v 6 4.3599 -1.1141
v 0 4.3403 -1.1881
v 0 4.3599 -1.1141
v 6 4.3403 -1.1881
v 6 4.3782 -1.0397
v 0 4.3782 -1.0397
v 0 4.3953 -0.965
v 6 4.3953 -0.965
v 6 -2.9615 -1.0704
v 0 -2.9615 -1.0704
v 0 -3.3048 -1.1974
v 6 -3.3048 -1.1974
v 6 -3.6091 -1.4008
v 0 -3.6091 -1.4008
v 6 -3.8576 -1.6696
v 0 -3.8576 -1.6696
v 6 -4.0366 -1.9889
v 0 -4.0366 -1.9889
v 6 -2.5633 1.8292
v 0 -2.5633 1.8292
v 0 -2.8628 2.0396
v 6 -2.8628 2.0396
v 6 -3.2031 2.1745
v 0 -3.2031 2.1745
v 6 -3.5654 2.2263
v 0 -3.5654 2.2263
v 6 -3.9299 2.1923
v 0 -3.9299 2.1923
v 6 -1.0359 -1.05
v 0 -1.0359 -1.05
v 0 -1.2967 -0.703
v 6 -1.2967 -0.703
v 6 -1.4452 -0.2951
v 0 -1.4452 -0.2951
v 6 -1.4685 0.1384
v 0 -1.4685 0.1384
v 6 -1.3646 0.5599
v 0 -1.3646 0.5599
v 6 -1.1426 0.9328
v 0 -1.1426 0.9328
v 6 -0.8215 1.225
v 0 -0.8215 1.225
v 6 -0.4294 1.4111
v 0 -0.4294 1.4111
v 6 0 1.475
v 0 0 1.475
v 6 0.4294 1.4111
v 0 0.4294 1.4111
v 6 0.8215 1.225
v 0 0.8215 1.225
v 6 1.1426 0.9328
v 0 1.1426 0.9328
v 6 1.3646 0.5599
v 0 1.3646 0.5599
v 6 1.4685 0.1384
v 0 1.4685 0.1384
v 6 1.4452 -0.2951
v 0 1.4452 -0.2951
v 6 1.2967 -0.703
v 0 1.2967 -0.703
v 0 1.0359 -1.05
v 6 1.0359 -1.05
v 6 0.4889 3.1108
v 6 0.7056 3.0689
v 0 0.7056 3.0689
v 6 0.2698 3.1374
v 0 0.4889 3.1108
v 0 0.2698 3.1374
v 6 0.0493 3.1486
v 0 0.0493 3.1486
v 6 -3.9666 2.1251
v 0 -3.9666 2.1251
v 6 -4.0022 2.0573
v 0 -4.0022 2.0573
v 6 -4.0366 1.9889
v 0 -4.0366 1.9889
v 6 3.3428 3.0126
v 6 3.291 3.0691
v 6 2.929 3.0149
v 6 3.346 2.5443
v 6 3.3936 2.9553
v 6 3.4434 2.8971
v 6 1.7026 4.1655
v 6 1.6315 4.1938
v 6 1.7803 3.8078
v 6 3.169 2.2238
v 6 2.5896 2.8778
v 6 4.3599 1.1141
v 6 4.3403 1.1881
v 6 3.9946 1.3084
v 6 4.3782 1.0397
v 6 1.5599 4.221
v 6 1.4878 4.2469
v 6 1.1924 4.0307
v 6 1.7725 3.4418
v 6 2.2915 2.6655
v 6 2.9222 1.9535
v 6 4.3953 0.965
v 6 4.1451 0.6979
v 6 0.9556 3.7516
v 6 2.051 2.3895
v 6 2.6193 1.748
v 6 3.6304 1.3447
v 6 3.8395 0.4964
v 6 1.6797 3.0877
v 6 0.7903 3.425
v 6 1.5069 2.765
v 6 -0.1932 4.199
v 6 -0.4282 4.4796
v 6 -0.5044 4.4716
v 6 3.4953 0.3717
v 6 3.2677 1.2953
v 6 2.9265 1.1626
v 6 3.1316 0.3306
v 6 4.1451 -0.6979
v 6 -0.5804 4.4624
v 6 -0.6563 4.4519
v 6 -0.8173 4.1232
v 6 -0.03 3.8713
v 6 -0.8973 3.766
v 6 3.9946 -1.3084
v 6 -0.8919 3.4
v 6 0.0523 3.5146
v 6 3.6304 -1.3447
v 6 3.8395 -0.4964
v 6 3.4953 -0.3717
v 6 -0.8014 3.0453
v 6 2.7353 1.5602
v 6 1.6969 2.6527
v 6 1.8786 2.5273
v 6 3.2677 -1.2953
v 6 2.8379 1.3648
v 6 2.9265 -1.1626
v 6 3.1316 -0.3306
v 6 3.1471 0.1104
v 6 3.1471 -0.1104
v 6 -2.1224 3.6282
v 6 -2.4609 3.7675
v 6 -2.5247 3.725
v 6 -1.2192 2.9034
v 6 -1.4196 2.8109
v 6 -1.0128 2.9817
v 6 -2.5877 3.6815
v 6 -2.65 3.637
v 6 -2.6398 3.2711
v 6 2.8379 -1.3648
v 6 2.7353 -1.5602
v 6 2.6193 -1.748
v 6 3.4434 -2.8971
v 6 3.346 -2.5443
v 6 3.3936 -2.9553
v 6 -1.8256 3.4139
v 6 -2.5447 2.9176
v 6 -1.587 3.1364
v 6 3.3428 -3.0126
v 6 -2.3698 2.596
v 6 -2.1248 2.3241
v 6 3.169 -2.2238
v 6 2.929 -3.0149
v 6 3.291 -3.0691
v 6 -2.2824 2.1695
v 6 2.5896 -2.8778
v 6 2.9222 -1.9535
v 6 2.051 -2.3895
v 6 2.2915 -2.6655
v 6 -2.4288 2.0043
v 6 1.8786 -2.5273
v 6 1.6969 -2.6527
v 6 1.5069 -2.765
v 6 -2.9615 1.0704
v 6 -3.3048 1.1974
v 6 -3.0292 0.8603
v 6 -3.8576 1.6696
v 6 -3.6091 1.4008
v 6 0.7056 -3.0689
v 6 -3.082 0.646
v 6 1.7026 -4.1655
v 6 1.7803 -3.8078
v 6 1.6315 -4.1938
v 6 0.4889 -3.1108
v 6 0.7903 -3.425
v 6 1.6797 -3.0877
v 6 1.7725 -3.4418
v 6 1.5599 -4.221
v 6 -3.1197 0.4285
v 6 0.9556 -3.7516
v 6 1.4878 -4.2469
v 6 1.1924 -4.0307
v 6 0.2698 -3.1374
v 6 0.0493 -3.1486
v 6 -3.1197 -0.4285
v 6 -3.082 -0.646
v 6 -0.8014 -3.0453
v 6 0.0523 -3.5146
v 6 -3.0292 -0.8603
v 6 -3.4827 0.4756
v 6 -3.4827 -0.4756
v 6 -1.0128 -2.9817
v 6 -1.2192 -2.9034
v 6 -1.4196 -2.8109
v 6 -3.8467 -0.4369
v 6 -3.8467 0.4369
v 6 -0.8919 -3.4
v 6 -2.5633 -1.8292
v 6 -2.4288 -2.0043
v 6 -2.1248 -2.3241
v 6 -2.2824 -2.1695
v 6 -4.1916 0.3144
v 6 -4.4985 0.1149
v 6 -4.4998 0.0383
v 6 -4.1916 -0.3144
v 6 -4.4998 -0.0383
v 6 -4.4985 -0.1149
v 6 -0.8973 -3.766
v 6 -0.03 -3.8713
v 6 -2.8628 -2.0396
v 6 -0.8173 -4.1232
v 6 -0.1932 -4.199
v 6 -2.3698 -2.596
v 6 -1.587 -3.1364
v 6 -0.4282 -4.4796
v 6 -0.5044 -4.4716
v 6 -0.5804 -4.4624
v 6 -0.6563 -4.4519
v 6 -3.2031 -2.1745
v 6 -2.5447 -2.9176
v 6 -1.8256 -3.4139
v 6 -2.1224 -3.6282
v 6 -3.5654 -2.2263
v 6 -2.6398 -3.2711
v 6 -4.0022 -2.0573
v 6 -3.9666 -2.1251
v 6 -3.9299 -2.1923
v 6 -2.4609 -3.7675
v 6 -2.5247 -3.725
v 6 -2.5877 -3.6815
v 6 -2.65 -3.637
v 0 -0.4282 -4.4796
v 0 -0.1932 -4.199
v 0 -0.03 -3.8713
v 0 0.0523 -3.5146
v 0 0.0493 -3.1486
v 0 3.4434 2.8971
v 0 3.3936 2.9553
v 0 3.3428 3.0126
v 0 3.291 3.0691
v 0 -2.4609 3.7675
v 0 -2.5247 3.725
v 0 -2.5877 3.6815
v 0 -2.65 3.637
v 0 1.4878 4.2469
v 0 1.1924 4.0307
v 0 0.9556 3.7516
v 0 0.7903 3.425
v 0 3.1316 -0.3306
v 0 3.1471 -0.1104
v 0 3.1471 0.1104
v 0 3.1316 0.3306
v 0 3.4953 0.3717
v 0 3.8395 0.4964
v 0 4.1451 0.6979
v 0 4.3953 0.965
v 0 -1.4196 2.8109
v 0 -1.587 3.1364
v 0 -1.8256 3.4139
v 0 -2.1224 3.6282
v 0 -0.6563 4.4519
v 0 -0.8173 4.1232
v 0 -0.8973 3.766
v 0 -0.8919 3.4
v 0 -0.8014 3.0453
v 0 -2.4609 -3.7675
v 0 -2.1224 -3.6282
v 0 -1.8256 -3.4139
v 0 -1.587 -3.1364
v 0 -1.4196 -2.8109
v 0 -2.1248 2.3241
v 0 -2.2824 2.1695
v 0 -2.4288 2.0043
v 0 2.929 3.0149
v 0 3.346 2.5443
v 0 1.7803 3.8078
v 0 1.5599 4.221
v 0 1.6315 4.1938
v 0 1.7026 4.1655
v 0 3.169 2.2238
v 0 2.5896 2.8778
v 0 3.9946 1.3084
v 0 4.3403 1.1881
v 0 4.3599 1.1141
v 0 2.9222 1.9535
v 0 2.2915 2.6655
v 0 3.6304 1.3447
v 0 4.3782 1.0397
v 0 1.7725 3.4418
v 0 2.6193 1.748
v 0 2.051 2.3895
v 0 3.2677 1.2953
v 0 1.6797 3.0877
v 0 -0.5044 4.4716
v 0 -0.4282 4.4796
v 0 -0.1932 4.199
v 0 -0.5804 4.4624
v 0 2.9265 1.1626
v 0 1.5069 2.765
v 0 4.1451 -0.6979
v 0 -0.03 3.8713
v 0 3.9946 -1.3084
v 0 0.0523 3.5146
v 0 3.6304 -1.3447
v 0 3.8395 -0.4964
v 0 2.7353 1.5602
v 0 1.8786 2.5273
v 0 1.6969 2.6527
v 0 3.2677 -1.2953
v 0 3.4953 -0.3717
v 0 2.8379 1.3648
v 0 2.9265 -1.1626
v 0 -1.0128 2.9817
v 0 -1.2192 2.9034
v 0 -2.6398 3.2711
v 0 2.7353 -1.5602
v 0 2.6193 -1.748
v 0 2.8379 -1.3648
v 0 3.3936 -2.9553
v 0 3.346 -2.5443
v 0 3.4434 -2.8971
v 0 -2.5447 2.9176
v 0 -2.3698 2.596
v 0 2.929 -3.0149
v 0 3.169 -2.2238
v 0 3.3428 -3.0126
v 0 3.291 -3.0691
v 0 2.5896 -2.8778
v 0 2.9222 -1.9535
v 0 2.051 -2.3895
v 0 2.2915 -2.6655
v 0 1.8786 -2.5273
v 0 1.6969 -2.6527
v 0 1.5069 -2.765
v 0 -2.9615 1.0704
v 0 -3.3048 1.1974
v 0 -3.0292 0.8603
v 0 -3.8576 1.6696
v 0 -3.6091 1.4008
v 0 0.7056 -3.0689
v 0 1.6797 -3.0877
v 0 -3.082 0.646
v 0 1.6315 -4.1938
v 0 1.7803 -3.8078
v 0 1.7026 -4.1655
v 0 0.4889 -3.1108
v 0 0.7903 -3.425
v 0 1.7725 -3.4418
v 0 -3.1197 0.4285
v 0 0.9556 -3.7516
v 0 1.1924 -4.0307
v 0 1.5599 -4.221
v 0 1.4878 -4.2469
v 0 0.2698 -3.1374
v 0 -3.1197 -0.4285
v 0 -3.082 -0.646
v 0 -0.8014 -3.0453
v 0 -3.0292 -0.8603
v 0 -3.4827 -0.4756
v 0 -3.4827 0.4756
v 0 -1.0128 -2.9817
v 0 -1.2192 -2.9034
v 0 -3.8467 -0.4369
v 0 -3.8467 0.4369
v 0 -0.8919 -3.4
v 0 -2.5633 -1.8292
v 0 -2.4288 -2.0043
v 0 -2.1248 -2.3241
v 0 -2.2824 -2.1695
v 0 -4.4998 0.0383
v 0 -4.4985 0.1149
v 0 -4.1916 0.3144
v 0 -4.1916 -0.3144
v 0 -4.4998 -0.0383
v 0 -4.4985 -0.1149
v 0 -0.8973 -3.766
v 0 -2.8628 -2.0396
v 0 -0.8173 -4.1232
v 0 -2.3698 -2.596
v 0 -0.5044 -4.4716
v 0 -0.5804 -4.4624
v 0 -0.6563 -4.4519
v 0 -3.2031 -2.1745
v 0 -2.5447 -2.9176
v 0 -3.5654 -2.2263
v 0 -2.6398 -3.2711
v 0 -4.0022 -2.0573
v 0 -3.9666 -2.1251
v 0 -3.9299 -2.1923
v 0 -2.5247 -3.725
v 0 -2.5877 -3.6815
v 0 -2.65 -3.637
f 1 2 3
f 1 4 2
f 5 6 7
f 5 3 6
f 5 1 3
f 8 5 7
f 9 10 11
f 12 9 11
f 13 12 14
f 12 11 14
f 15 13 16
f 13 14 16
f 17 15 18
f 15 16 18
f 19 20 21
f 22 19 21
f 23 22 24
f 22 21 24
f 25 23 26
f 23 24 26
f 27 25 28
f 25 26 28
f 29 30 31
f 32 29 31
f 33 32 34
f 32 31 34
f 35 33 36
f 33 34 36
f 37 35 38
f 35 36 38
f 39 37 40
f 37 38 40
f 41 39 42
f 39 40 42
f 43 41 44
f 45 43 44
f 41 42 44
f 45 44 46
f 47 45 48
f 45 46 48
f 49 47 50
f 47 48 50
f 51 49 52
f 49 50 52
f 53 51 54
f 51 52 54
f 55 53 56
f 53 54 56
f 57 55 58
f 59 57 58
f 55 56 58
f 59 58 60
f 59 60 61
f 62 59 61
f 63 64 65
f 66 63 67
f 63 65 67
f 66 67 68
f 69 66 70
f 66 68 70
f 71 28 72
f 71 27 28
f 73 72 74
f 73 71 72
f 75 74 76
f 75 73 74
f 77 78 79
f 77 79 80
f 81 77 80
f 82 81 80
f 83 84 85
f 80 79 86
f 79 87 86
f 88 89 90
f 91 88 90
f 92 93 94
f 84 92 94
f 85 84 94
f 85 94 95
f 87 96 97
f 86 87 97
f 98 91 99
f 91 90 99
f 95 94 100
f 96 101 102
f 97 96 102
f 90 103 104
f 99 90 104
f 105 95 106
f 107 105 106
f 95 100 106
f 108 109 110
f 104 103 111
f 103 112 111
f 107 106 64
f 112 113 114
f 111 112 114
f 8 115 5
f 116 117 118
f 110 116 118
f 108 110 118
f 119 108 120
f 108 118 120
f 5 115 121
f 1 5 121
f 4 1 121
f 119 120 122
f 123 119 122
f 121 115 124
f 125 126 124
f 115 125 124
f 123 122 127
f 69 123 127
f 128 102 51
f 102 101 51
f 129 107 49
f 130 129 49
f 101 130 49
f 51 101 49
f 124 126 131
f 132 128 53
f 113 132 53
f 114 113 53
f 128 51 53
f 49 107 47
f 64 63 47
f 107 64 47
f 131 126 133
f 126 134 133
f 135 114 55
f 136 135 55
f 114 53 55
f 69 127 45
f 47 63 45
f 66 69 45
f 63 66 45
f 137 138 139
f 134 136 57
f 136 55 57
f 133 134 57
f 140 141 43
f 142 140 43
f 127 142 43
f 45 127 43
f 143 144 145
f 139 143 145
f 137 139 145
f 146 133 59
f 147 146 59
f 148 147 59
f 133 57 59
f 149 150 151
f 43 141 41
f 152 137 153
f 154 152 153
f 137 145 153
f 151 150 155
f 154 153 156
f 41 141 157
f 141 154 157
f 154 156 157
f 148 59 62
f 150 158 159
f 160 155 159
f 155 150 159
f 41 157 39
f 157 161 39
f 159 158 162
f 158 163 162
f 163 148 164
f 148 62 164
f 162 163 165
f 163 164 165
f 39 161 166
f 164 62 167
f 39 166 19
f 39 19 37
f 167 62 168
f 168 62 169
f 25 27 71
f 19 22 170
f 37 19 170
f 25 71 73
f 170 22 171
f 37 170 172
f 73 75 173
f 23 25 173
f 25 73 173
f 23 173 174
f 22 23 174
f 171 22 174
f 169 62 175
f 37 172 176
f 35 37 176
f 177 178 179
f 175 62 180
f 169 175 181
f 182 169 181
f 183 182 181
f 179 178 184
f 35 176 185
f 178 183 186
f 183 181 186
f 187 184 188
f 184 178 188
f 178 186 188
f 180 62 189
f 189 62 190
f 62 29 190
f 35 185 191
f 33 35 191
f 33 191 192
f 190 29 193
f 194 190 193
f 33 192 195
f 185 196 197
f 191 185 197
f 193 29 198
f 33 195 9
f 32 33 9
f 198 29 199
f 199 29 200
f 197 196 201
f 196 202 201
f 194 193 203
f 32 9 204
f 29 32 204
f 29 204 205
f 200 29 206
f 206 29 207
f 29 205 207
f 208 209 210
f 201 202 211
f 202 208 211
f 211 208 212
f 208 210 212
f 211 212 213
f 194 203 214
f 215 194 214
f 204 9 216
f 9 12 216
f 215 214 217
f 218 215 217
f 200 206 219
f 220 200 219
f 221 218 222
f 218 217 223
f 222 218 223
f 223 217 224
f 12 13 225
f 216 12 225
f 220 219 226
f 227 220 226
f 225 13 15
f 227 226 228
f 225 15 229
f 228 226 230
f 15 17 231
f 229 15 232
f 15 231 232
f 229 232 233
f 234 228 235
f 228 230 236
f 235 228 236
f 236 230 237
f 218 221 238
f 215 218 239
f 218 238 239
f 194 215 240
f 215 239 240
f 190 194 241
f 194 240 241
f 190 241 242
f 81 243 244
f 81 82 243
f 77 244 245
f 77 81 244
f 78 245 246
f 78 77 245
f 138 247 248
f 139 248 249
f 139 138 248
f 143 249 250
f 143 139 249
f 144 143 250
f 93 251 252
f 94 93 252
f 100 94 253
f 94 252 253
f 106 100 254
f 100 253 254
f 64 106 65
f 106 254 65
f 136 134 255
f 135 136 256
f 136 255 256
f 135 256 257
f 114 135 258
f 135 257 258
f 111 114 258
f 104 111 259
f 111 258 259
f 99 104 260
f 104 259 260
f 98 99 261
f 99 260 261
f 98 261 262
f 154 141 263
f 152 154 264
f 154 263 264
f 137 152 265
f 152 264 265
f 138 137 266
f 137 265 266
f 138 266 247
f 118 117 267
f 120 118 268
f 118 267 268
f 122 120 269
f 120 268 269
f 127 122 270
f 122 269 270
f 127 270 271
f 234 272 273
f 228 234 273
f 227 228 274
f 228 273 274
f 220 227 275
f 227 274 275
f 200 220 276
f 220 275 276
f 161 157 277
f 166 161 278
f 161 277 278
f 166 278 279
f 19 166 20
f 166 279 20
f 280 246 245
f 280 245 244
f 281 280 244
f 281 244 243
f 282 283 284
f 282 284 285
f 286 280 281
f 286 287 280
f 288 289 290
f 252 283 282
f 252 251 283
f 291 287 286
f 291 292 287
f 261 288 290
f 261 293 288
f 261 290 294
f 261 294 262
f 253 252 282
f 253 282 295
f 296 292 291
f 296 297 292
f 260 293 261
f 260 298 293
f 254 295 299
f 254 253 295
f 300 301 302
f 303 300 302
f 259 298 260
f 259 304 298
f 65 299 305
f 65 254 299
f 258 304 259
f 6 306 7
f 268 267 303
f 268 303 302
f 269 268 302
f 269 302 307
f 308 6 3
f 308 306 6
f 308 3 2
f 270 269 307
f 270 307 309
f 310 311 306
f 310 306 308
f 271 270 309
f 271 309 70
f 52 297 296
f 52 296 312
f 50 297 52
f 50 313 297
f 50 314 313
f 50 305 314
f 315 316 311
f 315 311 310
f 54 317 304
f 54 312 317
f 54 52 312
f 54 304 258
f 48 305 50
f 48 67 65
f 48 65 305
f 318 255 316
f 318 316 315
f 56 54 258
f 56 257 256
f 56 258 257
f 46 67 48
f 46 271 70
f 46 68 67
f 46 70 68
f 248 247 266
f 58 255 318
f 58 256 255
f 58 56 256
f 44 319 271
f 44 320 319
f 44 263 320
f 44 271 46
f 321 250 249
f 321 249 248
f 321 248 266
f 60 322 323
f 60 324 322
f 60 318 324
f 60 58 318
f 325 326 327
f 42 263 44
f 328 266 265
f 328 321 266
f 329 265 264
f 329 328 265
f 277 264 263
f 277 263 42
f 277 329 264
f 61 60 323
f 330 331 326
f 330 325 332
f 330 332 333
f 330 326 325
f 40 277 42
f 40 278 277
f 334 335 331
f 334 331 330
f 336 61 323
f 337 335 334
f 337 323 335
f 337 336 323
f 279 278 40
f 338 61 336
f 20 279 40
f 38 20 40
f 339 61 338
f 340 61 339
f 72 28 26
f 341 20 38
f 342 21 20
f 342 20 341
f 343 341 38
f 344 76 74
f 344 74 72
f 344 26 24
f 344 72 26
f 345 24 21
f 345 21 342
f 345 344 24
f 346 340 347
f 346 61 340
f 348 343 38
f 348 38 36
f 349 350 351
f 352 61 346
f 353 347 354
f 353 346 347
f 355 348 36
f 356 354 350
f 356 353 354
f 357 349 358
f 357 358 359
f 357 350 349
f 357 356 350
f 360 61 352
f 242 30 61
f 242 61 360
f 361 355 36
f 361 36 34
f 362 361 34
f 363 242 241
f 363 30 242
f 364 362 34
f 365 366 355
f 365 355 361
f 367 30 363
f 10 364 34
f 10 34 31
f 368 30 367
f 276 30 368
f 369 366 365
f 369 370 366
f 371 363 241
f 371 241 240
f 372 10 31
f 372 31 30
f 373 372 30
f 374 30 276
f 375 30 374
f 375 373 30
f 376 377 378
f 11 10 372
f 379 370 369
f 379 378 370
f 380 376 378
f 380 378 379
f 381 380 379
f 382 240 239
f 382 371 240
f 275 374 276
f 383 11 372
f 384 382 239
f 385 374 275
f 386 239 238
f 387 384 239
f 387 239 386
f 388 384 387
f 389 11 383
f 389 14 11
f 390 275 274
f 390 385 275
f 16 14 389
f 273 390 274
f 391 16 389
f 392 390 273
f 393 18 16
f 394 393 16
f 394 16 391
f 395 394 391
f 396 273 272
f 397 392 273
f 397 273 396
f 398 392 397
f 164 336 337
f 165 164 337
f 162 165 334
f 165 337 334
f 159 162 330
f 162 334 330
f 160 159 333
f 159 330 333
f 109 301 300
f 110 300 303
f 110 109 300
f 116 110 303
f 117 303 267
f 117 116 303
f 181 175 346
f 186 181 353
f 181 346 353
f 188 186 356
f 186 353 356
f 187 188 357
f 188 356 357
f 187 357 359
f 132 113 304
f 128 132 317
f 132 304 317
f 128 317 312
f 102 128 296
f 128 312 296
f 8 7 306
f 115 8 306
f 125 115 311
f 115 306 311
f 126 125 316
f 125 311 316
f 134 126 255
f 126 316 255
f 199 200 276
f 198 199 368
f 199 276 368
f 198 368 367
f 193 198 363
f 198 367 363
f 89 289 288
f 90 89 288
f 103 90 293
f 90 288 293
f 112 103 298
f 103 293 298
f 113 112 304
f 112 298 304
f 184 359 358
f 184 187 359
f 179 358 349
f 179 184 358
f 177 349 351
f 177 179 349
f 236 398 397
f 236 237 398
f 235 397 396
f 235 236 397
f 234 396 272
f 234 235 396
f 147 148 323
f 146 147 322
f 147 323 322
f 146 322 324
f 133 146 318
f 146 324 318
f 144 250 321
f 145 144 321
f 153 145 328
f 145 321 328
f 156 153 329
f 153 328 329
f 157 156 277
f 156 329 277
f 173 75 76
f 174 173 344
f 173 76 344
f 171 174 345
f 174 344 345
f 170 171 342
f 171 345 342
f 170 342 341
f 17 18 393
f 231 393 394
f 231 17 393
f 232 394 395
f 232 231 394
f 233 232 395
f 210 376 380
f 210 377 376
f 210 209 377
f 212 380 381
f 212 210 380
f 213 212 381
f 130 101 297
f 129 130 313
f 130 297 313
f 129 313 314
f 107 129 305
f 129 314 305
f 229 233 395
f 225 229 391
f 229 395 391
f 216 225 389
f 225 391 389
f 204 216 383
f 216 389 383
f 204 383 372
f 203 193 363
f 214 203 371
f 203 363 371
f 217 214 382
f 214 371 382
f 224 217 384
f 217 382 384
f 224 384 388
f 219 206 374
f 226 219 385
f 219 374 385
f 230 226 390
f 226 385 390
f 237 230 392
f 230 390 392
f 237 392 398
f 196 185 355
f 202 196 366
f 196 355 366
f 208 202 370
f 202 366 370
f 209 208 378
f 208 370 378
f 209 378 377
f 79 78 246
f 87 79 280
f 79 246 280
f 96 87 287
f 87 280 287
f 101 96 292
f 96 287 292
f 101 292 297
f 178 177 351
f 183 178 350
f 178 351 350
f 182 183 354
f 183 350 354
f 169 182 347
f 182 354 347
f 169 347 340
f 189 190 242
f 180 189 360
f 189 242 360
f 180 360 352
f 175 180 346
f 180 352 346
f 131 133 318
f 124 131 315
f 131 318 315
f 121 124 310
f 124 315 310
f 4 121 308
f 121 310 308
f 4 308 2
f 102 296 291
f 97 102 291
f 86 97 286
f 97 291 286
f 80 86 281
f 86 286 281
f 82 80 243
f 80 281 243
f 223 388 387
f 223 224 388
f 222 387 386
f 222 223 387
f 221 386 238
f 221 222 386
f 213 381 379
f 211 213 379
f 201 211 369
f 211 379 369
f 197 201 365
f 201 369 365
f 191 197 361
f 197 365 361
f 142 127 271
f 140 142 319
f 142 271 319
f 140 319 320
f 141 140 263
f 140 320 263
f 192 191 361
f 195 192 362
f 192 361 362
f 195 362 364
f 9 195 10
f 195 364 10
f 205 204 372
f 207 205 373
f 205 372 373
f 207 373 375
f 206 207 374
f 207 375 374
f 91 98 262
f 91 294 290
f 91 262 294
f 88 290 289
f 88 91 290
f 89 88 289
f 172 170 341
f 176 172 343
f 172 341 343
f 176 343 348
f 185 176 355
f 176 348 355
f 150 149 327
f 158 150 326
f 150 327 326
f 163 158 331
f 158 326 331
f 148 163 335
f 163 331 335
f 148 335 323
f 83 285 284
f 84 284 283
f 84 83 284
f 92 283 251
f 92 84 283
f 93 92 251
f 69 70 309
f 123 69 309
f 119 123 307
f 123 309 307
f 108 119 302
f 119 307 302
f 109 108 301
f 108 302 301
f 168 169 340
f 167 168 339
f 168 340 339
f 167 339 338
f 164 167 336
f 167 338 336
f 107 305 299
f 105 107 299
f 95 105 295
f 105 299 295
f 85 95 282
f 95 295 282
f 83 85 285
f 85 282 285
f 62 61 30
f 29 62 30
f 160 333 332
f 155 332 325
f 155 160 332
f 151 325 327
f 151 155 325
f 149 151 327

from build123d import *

# Parameters (mm, degrees)
BASPROSKE_W        = 6
BASPROSKE_H        = 4.5
TOOTHCUT_DEPTH     = 9.746427842
TEETHCUTS_COUNT    = 13
CUT_EXTRUDE1_REACH = 10.736


with BuildPart() as part:
    # BasProSke → Base-Revolve (revolve)
    with BuildSketch(Plane(origin=(0, 0, 0), x_dir=(1, 0, 0), z_dir=(0, 1, 0)), mode=Mode.PRIVATE) as base_revolve_sk:
        with Locations((3, 2.25)):
            Rectangle(BASPROSKE_W, BASPROSKE_H)
    revolve(base_revolve_sk.sketch.rotate(Axis((-10, 0, 0), (1, 0, 0)), 180), axis=Axis((-10, 0, 0), (1, 0, 0)))

    # TooCutSke → ToothCut (cut, through all)
    with BuildSketch(Plane(origin=(0, 0, 0), x_dir=(0, 0, -1), z_dir=(1, 0, 0))):
        with BuildLine():
            ThreePointArc((0.330578579, 3.131600039), (0, 3.149), (-0.330578579, 3.131600039))
            ThreePointArc((-0.330578579, 3.131600039), (-0.504119116, 3.854627805), (-0.992642471, 4.415190379))
            ThreePointArc((-0.992642471, 4.415190379), (0, 4.5254), (0.992642471, 4.415190379))
            ThreePointArc((0.992642471, 4.415190379), (0.504119116, 3.854627805), (0.330578579, 3.131600039))
        make_face()
    toothcut = extrude(amount=TOOTHCUT_DEPTH, mode=Mode.SUBTRACT)

    # TeethCuts: ToothCut ×13 about axis
    teethcuts_axis = Axis((0, 0, 0), (1, 0, 0))
    for i in range(1, TEETHCUTS_COUNT):
        add(toothcut.rotate(teethcuts_axis, i * 360 / TEETHCUTS_COUNT), mode=Mode.SUBTRACT)

    # Sketch1 → Cut-Extrude1 (cut, up to next)
    with BuildSketch(Plane.ZY, mode=Mode.PRIVATE) as cut_extrude1_sk1:
        with BuildLine():
            Line((-1.05, 1.035917468), (-1.05, -1.035917468))
            ThreePointArc((-1.05, -1.035917468), (1.475, 0), (-1.05, 1.035917468))
        make_face()
    cut_extrude1_tool1 = extrude(cut_extrude1_sk1.sketch, amount=-CUT_EXTRUDE1_REACH, mode=Mode.PRIVATE) & part.part
    add(cut_extrude1_tool1.solids().sort_by_distance((0, 0, 0.118985))[0], mode=Mode.SUBTRACT)


solid = part.part
